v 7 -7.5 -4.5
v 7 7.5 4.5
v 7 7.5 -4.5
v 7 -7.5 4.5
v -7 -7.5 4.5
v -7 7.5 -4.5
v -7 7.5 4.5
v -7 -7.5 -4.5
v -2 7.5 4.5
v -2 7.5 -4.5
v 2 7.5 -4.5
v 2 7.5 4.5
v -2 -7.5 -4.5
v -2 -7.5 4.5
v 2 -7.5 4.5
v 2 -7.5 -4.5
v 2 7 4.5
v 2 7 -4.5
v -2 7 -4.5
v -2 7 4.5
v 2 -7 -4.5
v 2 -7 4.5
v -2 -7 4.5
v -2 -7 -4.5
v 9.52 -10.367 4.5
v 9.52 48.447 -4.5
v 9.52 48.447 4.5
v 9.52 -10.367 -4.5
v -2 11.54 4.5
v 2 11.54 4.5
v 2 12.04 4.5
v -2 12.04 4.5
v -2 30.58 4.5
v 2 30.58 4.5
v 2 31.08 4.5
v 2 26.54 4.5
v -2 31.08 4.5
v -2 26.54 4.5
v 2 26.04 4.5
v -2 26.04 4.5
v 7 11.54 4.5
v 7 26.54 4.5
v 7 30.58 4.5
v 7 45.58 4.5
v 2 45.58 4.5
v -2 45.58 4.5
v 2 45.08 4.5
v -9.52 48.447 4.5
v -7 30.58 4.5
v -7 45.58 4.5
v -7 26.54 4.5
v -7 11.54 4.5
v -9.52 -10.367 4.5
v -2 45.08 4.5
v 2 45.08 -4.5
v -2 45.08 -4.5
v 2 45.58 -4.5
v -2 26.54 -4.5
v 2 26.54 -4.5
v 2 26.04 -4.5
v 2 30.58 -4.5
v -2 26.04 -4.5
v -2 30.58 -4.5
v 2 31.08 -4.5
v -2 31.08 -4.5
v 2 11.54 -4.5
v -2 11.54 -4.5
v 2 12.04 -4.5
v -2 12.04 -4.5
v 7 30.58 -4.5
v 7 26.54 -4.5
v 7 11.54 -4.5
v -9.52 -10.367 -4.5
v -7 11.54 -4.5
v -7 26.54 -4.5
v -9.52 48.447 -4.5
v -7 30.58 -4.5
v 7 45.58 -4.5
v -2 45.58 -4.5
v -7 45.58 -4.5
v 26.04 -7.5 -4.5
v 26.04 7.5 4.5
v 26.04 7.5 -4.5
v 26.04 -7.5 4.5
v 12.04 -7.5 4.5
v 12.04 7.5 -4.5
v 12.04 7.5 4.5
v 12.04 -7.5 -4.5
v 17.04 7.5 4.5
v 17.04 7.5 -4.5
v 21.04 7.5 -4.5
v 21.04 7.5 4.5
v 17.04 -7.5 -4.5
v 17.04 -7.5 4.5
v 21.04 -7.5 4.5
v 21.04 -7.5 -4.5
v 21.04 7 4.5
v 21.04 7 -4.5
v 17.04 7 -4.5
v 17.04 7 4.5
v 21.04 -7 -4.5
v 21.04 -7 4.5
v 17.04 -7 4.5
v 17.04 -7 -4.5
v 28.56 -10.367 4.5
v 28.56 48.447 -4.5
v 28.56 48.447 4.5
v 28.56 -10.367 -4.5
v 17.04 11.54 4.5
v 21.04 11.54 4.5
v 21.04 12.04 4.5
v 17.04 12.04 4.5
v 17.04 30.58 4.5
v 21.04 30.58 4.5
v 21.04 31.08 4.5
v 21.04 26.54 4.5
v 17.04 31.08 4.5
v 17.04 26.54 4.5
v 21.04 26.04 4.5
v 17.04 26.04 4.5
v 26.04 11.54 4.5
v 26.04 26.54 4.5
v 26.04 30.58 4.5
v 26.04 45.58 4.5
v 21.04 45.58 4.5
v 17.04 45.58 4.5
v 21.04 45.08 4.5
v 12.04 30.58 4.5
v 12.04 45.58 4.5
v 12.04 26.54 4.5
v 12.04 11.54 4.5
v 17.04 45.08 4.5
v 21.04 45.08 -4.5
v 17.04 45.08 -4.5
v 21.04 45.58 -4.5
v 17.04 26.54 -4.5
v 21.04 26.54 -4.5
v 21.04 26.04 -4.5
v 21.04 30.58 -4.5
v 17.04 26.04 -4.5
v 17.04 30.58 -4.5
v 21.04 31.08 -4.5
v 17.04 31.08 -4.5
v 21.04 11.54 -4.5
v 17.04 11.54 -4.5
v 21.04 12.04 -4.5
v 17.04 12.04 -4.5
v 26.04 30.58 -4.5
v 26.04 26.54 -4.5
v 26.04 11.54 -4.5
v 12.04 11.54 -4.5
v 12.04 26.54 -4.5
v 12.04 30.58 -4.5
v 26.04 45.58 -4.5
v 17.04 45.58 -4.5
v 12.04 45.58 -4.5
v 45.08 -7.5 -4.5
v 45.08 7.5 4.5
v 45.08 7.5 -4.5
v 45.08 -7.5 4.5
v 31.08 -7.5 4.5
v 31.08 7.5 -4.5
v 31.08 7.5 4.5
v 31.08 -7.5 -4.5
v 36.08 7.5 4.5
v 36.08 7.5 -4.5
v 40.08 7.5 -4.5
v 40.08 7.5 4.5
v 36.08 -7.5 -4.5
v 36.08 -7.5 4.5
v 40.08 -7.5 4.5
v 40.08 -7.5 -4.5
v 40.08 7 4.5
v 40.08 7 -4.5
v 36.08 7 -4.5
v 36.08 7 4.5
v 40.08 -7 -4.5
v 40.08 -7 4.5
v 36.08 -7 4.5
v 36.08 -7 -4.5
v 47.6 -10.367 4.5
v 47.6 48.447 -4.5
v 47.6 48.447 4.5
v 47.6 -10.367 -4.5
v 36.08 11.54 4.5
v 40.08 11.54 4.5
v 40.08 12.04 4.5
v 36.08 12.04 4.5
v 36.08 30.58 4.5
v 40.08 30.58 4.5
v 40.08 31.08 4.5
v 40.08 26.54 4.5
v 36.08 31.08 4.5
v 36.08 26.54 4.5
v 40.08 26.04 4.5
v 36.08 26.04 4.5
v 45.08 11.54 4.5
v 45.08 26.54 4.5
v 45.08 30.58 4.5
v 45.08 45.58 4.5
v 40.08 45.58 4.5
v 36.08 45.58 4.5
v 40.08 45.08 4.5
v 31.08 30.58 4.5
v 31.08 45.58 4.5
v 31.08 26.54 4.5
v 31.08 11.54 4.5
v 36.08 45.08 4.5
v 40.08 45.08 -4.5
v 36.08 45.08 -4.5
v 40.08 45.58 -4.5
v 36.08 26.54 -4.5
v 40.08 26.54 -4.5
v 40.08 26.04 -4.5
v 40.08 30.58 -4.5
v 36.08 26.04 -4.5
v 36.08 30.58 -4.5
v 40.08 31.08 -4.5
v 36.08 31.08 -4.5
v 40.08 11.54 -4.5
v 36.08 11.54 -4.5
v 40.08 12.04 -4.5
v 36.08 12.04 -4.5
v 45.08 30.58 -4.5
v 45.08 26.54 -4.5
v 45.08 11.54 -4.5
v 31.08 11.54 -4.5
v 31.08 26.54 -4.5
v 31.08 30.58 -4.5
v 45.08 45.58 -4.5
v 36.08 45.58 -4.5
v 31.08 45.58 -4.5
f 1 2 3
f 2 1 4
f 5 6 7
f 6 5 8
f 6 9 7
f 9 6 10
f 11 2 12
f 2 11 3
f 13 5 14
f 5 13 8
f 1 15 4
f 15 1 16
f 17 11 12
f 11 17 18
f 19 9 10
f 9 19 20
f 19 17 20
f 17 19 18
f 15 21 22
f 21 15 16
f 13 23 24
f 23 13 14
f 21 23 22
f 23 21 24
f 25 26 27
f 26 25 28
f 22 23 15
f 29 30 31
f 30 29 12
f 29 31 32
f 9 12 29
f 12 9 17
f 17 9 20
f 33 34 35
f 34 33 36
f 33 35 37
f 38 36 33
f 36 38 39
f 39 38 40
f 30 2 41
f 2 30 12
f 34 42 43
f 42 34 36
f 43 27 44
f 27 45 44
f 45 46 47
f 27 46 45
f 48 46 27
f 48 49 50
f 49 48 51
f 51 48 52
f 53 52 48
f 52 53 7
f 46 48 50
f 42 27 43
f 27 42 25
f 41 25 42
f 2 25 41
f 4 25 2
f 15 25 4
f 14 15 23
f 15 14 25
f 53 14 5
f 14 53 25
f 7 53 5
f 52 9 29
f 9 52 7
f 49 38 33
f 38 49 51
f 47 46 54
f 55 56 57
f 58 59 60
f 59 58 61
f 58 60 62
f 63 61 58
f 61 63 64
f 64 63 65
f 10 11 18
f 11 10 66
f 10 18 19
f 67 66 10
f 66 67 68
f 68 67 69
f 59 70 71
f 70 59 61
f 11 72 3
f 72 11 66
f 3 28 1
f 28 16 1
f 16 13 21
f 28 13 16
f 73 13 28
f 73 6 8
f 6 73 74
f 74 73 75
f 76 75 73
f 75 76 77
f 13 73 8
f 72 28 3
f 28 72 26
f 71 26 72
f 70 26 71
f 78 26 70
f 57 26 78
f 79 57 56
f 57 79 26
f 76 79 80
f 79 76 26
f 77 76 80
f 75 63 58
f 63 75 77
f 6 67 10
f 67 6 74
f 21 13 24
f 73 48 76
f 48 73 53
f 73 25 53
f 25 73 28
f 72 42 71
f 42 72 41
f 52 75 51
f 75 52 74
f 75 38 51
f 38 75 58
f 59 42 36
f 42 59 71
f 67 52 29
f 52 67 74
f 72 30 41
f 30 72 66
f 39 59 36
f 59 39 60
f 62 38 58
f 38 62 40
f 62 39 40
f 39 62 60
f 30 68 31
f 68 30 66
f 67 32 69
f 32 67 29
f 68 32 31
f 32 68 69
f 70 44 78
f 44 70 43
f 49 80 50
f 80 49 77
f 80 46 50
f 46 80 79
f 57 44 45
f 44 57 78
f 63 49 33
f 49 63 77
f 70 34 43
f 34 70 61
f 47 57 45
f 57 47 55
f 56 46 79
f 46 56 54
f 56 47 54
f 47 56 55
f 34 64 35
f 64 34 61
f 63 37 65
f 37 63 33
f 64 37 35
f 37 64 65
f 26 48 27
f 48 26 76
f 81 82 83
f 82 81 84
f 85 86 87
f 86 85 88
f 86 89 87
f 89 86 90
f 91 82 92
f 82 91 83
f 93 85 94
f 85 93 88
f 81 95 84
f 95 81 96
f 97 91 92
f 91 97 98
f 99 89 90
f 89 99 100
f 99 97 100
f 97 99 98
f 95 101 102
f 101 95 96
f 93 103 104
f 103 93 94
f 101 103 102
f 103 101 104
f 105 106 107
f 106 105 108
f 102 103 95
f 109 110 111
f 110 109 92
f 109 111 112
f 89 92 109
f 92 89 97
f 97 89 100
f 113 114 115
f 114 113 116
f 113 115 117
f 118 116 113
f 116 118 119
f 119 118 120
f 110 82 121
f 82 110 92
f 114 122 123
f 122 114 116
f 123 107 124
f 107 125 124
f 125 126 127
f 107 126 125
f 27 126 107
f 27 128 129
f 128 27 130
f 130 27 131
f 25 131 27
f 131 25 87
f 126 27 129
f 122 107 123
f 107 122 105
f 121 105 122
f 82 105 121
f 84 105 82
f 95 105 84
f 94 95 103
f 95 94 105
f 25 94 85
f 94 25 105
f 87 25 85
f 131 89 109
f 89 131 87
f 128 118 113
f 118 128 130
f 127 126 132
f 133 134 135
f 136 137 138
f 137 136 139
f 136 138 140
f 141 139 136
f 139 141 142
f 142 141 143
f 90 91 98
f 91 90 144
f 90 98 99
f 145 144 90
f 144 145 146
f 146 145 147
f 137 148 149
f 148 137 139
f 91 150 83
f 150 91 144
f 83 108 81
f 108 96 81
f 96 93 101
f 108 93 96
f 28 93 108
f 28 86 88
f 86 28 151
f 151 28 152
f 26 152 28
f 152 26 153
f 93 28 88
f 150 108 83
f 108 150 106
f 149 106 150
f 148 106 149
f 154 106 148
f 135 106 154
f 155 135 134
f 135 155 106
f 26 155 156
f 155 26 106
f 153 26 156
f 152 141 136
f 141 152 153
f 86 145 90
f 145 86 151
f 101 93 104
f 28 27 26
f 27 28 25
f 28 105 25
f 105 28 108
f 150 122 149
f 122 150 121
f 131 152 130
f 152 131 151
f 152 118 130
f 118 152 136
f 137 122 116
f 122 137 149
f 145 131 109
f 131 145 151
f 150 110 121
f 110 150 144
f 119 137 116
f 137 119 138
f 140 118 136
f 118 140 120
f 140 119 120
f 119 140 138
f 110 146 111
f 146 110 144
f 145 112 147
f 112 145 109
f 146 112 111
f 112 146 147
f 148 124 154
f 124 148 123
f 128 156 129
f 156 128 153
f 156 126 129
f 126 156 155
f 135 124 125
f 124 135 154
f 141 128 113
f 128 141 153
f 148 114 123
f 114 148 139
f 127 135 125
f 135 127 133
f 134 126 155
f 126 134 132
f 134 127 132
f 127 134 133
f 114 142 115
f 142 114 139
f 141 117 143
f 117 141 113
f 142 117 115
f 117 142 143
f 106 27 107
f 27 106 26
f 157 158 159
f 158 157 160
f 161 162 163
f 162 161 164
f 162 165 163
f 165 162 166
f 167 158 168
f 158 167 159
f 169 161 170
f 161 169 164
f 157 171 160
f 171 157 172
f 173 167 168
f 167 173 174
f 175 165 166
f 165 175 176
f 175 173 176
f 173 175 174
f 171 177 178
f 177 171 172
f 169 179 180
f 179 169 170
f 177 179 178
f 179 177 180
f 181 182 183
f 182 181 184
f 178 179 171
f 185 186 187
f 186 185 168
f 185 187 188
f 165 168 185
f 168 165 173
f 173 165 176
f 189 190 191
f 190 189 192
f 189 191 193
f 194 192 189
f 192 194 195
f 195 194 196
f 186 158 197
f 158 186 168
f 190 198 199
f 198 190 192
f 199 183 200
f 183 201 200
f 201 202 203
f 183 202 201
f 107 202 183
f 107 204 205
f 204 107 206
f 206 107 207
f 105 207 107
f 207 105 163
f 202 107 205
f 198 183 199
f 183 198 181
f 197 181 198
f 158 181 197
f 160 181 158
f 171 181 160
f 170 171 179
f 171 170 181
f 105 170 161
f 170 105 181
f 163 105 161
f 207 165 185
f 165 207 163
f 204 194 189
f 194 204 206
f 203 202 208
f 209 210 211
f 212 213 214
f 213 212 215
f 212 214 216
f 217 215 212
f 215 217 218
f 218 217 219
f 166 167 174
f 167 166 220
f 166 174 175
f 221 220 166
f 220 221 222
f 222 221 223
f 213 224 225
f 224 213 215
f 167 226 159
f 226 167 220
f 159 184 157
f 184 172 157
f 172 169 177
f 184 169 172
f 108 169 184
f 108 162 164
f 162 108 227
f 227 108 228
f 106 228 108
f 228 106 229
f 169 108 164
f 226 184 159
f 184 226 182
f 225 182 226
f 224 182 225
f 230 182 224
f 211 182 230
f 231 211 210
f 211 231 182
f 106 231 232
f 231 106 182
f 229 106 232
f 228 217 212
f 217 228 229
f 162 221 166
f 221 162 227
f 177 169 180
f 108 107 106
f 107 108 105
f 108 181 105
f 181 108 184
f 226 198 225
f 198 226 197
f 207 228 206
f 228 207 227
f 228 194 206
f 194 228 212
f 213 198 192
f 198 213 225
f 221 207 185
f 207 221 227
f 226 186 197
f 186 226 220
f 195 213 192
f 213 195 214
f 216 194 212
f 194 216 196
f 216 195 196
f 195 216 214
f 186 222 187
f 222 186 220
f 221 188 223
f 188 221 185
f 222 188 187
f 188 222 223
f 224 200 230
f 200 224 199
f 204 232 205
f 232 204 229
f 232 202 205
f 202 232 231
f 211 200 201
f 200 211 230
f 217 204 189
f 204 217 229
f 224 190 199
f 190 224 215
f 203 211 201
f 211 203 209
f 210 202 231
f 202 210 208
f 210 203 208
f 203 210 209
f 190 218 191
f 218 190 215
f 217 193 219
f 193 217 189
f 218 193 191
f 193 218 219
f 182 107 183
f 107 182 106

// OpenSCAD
/*[Station]*/
rows=3;
columns=3;
caseThickness=9;

/*[Legs]*/
legs=false;
legWidth=3;
legLength=3;
legHeight=6;

/*[Puzzle]*/
puzzle=false;
leftPuzzle=true;
rightPuzzle=true;
frontPuzzle=true;
backPuzzle=true;



/*[Danger zone]*/
space=19.04;
cutXSize=14;
cutYSize=15;
notchX=4;
notchY=0.50;
showSwitch=false;
plateLength=space*1.089;

function legZ(thickness,legHeight) = -(thickness*0.5+legHeight*0.5);

module cherrySwitch(){
	// Awesome Cherry MX model created by gcb
	// Lib: Cherry MX switch - reference
	// Download here: https://www.thingiverse.com/thing:421524
	//  p=cherrySize/2+0.53;
	translate([0,0,13.2])
		import("switch_mx.stl");
}

module leg(){
  cube([legWidth,legLength,legHeight],center=true);
}


module legs(thickness,rows,cols, row, col){
  x=(space*0.5-legWidth*0.5);
  y=(plateLength*0.5-legLength*0.5);
  z=legZ(thickness,legHeight);
  
  translate([0,0,0])translate([-x,-y,z])leg();
  translate([space*rows,0,0])translate([x,-y,z])leg();
  translate([0,space*cols,0])translate([-x,y,z])leg();
  translate([space*rows,space*cols,0])translate([x,y,z])leg();
  
}

module KeyPlate(w=space,l=plateLength,h=caseThickness,center=true){
	cube([w,l,h],center=center);
}

module KeyCut(thickness,x,y,notchX,notchY){
  union(){
    difference(){
      cube([x,y,thickness+2],center=true);
      
      translate([0,y/2,0])
      cube([notchX,notchY,thickness+3],center=true);
      
      translate([0,-y/2,0])
      cube([notchX,notchY,thickness+3],center=true);
    }
  }
}

module puzzleCut(thickness,hook){
  size = hook ? 9 : 10;
  move = hook ? 1 : 0;
  difference(){
    translate([0,0,0])rotate([0,0,45])cube([size,size,thickness],center=true);
    
    translate([0,size*0.4,0])cube([size*2,size,thickness+2],center=true);
    
    translate([0,-((size*0.8)+move),0])cube([size*2,size,thickness+2],center=true);
  }
}

module plate(rows, cols, thickness,space,cutX,cutY,notchX,notchY){
   union(){
    for(r=[0:rows-1]){
      for(c=[0:cols-1]){
        translate([space*r, space*c,0]){
          difference(){
            KeyPlate();
            KeyCut(thickness,cutX,cutY,notchX,notchY);
          }
          if(showSwitch){
            #translate([0,0,thickness/2])cherrySwitch();
          }
          
          
        }
      }
    }
  }
}

module build(rows, cols, thickness,space,cutX,cutY,notchX,notchY){
  union(){
    if(puzzle){
      difference(){
        plate(rows,cols,thickness,space,cutX,cutY,notchX,notchY);
        if(backPuzzle){
          translate([0,-space*0.39,0])puzzleCut(thickness+2,false);
          
          translate([space*(rows-1),-space*0.39,0])puzzleCut(thickness+2,false);
        }
    
        if(rightPuzzle){
          translate([-space*0.346,0,0])rotate([0,0,-90])puzzleCut(thickness+2,false);
          
          translate([-space*0.346,space*(cols-1),0])rotate([0,0,-90])puzzleCut(thickness+2,false);
        }
      }
      
      if(frontPuzzle){
        translate([0,space*cols-space*0.3,0])puzzleCut(thickness,true);
        
        translate([space*(rows-1),space*cols-space*0.3,0])puzzleCut(thickness,true);
      }
      
      if(leftPuzzle){
        translate([space*rows-space*0.35,0,0])rotate([0,0,-90])puzzleCut(thickness,true);
        
        translate([space*rows-space*0.35,space*(cols-1),0])rotate([0,0,-90])puzzleCut(thickness,true);
      }
      
    } else {
      plate(rows,cols,thickness,space,cutX,cutY,notchX,notchY);
    }
 
    if(legs){
      legs(thickness,rows-1,cols-1,0,0);
    }
  }
}

build(rows, columns, caseThickness, space,cutXSize,cutYSize,notchX,notchY*2);

//puzzleCut(caseThickness,true);
